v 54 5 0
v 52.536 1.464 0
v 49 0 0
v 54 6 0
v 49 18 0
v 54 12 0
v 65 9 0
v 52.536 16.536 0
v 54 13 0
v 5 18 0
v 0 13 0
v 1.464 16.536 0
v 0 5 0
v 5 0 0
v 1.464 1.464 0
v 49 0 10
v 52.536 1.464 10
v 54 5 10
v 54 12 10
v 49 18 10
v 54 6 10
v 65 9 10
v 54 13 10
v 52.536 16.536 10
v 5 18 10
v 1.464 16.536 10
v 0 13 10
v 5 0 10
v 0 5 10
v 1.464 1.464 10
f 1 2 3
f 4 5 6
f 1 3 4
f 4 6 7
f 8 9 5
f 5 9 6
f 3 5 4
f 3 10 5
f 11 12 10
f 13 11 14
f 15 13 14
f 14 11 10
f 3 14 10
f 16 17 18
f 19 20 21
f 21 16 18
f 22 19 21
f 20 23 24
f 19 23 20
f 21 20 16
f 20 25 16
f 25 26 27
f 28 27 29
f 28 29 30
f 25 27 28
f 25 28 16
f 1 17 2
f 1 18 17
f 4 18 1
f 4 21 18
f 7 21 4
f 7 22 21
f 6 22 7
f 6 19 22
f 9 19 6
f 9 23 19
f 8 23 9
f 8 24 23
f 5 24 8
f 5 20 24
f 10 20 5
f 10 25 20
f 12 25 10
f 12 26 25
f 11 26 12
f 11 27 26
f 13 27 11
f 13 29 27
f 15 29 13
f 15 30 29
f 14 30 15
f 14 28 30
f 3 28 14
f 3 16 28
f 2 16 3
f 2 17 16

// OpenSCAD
$fn = 32;

// ----------------------------------------------------------------------
// Ratchet pawl: 54 x 18 mm body, beak 11 mm с правого торца
// ----------------------------------------------------------------------

// --- parameters (mm) ---
profile_height = 10;      // extrusion height
profile_points = 15;      // points of the closed outline

profile = [[0, 5], [1.464, 1.464], [5, 0], [49, 0], [52.536, 1.464], [54, 5], [54, 6], [65, 9], [54, 12], [54, 13], [52.536, 16.536], [49, 18], [5, 18], [1.464, 16.536], [0, 13]];  // single closed polygon, 15 points, counter clockwise

// --- the one profile operation ---
linear_extrude(height = profile_height) polygon(points = profile);
